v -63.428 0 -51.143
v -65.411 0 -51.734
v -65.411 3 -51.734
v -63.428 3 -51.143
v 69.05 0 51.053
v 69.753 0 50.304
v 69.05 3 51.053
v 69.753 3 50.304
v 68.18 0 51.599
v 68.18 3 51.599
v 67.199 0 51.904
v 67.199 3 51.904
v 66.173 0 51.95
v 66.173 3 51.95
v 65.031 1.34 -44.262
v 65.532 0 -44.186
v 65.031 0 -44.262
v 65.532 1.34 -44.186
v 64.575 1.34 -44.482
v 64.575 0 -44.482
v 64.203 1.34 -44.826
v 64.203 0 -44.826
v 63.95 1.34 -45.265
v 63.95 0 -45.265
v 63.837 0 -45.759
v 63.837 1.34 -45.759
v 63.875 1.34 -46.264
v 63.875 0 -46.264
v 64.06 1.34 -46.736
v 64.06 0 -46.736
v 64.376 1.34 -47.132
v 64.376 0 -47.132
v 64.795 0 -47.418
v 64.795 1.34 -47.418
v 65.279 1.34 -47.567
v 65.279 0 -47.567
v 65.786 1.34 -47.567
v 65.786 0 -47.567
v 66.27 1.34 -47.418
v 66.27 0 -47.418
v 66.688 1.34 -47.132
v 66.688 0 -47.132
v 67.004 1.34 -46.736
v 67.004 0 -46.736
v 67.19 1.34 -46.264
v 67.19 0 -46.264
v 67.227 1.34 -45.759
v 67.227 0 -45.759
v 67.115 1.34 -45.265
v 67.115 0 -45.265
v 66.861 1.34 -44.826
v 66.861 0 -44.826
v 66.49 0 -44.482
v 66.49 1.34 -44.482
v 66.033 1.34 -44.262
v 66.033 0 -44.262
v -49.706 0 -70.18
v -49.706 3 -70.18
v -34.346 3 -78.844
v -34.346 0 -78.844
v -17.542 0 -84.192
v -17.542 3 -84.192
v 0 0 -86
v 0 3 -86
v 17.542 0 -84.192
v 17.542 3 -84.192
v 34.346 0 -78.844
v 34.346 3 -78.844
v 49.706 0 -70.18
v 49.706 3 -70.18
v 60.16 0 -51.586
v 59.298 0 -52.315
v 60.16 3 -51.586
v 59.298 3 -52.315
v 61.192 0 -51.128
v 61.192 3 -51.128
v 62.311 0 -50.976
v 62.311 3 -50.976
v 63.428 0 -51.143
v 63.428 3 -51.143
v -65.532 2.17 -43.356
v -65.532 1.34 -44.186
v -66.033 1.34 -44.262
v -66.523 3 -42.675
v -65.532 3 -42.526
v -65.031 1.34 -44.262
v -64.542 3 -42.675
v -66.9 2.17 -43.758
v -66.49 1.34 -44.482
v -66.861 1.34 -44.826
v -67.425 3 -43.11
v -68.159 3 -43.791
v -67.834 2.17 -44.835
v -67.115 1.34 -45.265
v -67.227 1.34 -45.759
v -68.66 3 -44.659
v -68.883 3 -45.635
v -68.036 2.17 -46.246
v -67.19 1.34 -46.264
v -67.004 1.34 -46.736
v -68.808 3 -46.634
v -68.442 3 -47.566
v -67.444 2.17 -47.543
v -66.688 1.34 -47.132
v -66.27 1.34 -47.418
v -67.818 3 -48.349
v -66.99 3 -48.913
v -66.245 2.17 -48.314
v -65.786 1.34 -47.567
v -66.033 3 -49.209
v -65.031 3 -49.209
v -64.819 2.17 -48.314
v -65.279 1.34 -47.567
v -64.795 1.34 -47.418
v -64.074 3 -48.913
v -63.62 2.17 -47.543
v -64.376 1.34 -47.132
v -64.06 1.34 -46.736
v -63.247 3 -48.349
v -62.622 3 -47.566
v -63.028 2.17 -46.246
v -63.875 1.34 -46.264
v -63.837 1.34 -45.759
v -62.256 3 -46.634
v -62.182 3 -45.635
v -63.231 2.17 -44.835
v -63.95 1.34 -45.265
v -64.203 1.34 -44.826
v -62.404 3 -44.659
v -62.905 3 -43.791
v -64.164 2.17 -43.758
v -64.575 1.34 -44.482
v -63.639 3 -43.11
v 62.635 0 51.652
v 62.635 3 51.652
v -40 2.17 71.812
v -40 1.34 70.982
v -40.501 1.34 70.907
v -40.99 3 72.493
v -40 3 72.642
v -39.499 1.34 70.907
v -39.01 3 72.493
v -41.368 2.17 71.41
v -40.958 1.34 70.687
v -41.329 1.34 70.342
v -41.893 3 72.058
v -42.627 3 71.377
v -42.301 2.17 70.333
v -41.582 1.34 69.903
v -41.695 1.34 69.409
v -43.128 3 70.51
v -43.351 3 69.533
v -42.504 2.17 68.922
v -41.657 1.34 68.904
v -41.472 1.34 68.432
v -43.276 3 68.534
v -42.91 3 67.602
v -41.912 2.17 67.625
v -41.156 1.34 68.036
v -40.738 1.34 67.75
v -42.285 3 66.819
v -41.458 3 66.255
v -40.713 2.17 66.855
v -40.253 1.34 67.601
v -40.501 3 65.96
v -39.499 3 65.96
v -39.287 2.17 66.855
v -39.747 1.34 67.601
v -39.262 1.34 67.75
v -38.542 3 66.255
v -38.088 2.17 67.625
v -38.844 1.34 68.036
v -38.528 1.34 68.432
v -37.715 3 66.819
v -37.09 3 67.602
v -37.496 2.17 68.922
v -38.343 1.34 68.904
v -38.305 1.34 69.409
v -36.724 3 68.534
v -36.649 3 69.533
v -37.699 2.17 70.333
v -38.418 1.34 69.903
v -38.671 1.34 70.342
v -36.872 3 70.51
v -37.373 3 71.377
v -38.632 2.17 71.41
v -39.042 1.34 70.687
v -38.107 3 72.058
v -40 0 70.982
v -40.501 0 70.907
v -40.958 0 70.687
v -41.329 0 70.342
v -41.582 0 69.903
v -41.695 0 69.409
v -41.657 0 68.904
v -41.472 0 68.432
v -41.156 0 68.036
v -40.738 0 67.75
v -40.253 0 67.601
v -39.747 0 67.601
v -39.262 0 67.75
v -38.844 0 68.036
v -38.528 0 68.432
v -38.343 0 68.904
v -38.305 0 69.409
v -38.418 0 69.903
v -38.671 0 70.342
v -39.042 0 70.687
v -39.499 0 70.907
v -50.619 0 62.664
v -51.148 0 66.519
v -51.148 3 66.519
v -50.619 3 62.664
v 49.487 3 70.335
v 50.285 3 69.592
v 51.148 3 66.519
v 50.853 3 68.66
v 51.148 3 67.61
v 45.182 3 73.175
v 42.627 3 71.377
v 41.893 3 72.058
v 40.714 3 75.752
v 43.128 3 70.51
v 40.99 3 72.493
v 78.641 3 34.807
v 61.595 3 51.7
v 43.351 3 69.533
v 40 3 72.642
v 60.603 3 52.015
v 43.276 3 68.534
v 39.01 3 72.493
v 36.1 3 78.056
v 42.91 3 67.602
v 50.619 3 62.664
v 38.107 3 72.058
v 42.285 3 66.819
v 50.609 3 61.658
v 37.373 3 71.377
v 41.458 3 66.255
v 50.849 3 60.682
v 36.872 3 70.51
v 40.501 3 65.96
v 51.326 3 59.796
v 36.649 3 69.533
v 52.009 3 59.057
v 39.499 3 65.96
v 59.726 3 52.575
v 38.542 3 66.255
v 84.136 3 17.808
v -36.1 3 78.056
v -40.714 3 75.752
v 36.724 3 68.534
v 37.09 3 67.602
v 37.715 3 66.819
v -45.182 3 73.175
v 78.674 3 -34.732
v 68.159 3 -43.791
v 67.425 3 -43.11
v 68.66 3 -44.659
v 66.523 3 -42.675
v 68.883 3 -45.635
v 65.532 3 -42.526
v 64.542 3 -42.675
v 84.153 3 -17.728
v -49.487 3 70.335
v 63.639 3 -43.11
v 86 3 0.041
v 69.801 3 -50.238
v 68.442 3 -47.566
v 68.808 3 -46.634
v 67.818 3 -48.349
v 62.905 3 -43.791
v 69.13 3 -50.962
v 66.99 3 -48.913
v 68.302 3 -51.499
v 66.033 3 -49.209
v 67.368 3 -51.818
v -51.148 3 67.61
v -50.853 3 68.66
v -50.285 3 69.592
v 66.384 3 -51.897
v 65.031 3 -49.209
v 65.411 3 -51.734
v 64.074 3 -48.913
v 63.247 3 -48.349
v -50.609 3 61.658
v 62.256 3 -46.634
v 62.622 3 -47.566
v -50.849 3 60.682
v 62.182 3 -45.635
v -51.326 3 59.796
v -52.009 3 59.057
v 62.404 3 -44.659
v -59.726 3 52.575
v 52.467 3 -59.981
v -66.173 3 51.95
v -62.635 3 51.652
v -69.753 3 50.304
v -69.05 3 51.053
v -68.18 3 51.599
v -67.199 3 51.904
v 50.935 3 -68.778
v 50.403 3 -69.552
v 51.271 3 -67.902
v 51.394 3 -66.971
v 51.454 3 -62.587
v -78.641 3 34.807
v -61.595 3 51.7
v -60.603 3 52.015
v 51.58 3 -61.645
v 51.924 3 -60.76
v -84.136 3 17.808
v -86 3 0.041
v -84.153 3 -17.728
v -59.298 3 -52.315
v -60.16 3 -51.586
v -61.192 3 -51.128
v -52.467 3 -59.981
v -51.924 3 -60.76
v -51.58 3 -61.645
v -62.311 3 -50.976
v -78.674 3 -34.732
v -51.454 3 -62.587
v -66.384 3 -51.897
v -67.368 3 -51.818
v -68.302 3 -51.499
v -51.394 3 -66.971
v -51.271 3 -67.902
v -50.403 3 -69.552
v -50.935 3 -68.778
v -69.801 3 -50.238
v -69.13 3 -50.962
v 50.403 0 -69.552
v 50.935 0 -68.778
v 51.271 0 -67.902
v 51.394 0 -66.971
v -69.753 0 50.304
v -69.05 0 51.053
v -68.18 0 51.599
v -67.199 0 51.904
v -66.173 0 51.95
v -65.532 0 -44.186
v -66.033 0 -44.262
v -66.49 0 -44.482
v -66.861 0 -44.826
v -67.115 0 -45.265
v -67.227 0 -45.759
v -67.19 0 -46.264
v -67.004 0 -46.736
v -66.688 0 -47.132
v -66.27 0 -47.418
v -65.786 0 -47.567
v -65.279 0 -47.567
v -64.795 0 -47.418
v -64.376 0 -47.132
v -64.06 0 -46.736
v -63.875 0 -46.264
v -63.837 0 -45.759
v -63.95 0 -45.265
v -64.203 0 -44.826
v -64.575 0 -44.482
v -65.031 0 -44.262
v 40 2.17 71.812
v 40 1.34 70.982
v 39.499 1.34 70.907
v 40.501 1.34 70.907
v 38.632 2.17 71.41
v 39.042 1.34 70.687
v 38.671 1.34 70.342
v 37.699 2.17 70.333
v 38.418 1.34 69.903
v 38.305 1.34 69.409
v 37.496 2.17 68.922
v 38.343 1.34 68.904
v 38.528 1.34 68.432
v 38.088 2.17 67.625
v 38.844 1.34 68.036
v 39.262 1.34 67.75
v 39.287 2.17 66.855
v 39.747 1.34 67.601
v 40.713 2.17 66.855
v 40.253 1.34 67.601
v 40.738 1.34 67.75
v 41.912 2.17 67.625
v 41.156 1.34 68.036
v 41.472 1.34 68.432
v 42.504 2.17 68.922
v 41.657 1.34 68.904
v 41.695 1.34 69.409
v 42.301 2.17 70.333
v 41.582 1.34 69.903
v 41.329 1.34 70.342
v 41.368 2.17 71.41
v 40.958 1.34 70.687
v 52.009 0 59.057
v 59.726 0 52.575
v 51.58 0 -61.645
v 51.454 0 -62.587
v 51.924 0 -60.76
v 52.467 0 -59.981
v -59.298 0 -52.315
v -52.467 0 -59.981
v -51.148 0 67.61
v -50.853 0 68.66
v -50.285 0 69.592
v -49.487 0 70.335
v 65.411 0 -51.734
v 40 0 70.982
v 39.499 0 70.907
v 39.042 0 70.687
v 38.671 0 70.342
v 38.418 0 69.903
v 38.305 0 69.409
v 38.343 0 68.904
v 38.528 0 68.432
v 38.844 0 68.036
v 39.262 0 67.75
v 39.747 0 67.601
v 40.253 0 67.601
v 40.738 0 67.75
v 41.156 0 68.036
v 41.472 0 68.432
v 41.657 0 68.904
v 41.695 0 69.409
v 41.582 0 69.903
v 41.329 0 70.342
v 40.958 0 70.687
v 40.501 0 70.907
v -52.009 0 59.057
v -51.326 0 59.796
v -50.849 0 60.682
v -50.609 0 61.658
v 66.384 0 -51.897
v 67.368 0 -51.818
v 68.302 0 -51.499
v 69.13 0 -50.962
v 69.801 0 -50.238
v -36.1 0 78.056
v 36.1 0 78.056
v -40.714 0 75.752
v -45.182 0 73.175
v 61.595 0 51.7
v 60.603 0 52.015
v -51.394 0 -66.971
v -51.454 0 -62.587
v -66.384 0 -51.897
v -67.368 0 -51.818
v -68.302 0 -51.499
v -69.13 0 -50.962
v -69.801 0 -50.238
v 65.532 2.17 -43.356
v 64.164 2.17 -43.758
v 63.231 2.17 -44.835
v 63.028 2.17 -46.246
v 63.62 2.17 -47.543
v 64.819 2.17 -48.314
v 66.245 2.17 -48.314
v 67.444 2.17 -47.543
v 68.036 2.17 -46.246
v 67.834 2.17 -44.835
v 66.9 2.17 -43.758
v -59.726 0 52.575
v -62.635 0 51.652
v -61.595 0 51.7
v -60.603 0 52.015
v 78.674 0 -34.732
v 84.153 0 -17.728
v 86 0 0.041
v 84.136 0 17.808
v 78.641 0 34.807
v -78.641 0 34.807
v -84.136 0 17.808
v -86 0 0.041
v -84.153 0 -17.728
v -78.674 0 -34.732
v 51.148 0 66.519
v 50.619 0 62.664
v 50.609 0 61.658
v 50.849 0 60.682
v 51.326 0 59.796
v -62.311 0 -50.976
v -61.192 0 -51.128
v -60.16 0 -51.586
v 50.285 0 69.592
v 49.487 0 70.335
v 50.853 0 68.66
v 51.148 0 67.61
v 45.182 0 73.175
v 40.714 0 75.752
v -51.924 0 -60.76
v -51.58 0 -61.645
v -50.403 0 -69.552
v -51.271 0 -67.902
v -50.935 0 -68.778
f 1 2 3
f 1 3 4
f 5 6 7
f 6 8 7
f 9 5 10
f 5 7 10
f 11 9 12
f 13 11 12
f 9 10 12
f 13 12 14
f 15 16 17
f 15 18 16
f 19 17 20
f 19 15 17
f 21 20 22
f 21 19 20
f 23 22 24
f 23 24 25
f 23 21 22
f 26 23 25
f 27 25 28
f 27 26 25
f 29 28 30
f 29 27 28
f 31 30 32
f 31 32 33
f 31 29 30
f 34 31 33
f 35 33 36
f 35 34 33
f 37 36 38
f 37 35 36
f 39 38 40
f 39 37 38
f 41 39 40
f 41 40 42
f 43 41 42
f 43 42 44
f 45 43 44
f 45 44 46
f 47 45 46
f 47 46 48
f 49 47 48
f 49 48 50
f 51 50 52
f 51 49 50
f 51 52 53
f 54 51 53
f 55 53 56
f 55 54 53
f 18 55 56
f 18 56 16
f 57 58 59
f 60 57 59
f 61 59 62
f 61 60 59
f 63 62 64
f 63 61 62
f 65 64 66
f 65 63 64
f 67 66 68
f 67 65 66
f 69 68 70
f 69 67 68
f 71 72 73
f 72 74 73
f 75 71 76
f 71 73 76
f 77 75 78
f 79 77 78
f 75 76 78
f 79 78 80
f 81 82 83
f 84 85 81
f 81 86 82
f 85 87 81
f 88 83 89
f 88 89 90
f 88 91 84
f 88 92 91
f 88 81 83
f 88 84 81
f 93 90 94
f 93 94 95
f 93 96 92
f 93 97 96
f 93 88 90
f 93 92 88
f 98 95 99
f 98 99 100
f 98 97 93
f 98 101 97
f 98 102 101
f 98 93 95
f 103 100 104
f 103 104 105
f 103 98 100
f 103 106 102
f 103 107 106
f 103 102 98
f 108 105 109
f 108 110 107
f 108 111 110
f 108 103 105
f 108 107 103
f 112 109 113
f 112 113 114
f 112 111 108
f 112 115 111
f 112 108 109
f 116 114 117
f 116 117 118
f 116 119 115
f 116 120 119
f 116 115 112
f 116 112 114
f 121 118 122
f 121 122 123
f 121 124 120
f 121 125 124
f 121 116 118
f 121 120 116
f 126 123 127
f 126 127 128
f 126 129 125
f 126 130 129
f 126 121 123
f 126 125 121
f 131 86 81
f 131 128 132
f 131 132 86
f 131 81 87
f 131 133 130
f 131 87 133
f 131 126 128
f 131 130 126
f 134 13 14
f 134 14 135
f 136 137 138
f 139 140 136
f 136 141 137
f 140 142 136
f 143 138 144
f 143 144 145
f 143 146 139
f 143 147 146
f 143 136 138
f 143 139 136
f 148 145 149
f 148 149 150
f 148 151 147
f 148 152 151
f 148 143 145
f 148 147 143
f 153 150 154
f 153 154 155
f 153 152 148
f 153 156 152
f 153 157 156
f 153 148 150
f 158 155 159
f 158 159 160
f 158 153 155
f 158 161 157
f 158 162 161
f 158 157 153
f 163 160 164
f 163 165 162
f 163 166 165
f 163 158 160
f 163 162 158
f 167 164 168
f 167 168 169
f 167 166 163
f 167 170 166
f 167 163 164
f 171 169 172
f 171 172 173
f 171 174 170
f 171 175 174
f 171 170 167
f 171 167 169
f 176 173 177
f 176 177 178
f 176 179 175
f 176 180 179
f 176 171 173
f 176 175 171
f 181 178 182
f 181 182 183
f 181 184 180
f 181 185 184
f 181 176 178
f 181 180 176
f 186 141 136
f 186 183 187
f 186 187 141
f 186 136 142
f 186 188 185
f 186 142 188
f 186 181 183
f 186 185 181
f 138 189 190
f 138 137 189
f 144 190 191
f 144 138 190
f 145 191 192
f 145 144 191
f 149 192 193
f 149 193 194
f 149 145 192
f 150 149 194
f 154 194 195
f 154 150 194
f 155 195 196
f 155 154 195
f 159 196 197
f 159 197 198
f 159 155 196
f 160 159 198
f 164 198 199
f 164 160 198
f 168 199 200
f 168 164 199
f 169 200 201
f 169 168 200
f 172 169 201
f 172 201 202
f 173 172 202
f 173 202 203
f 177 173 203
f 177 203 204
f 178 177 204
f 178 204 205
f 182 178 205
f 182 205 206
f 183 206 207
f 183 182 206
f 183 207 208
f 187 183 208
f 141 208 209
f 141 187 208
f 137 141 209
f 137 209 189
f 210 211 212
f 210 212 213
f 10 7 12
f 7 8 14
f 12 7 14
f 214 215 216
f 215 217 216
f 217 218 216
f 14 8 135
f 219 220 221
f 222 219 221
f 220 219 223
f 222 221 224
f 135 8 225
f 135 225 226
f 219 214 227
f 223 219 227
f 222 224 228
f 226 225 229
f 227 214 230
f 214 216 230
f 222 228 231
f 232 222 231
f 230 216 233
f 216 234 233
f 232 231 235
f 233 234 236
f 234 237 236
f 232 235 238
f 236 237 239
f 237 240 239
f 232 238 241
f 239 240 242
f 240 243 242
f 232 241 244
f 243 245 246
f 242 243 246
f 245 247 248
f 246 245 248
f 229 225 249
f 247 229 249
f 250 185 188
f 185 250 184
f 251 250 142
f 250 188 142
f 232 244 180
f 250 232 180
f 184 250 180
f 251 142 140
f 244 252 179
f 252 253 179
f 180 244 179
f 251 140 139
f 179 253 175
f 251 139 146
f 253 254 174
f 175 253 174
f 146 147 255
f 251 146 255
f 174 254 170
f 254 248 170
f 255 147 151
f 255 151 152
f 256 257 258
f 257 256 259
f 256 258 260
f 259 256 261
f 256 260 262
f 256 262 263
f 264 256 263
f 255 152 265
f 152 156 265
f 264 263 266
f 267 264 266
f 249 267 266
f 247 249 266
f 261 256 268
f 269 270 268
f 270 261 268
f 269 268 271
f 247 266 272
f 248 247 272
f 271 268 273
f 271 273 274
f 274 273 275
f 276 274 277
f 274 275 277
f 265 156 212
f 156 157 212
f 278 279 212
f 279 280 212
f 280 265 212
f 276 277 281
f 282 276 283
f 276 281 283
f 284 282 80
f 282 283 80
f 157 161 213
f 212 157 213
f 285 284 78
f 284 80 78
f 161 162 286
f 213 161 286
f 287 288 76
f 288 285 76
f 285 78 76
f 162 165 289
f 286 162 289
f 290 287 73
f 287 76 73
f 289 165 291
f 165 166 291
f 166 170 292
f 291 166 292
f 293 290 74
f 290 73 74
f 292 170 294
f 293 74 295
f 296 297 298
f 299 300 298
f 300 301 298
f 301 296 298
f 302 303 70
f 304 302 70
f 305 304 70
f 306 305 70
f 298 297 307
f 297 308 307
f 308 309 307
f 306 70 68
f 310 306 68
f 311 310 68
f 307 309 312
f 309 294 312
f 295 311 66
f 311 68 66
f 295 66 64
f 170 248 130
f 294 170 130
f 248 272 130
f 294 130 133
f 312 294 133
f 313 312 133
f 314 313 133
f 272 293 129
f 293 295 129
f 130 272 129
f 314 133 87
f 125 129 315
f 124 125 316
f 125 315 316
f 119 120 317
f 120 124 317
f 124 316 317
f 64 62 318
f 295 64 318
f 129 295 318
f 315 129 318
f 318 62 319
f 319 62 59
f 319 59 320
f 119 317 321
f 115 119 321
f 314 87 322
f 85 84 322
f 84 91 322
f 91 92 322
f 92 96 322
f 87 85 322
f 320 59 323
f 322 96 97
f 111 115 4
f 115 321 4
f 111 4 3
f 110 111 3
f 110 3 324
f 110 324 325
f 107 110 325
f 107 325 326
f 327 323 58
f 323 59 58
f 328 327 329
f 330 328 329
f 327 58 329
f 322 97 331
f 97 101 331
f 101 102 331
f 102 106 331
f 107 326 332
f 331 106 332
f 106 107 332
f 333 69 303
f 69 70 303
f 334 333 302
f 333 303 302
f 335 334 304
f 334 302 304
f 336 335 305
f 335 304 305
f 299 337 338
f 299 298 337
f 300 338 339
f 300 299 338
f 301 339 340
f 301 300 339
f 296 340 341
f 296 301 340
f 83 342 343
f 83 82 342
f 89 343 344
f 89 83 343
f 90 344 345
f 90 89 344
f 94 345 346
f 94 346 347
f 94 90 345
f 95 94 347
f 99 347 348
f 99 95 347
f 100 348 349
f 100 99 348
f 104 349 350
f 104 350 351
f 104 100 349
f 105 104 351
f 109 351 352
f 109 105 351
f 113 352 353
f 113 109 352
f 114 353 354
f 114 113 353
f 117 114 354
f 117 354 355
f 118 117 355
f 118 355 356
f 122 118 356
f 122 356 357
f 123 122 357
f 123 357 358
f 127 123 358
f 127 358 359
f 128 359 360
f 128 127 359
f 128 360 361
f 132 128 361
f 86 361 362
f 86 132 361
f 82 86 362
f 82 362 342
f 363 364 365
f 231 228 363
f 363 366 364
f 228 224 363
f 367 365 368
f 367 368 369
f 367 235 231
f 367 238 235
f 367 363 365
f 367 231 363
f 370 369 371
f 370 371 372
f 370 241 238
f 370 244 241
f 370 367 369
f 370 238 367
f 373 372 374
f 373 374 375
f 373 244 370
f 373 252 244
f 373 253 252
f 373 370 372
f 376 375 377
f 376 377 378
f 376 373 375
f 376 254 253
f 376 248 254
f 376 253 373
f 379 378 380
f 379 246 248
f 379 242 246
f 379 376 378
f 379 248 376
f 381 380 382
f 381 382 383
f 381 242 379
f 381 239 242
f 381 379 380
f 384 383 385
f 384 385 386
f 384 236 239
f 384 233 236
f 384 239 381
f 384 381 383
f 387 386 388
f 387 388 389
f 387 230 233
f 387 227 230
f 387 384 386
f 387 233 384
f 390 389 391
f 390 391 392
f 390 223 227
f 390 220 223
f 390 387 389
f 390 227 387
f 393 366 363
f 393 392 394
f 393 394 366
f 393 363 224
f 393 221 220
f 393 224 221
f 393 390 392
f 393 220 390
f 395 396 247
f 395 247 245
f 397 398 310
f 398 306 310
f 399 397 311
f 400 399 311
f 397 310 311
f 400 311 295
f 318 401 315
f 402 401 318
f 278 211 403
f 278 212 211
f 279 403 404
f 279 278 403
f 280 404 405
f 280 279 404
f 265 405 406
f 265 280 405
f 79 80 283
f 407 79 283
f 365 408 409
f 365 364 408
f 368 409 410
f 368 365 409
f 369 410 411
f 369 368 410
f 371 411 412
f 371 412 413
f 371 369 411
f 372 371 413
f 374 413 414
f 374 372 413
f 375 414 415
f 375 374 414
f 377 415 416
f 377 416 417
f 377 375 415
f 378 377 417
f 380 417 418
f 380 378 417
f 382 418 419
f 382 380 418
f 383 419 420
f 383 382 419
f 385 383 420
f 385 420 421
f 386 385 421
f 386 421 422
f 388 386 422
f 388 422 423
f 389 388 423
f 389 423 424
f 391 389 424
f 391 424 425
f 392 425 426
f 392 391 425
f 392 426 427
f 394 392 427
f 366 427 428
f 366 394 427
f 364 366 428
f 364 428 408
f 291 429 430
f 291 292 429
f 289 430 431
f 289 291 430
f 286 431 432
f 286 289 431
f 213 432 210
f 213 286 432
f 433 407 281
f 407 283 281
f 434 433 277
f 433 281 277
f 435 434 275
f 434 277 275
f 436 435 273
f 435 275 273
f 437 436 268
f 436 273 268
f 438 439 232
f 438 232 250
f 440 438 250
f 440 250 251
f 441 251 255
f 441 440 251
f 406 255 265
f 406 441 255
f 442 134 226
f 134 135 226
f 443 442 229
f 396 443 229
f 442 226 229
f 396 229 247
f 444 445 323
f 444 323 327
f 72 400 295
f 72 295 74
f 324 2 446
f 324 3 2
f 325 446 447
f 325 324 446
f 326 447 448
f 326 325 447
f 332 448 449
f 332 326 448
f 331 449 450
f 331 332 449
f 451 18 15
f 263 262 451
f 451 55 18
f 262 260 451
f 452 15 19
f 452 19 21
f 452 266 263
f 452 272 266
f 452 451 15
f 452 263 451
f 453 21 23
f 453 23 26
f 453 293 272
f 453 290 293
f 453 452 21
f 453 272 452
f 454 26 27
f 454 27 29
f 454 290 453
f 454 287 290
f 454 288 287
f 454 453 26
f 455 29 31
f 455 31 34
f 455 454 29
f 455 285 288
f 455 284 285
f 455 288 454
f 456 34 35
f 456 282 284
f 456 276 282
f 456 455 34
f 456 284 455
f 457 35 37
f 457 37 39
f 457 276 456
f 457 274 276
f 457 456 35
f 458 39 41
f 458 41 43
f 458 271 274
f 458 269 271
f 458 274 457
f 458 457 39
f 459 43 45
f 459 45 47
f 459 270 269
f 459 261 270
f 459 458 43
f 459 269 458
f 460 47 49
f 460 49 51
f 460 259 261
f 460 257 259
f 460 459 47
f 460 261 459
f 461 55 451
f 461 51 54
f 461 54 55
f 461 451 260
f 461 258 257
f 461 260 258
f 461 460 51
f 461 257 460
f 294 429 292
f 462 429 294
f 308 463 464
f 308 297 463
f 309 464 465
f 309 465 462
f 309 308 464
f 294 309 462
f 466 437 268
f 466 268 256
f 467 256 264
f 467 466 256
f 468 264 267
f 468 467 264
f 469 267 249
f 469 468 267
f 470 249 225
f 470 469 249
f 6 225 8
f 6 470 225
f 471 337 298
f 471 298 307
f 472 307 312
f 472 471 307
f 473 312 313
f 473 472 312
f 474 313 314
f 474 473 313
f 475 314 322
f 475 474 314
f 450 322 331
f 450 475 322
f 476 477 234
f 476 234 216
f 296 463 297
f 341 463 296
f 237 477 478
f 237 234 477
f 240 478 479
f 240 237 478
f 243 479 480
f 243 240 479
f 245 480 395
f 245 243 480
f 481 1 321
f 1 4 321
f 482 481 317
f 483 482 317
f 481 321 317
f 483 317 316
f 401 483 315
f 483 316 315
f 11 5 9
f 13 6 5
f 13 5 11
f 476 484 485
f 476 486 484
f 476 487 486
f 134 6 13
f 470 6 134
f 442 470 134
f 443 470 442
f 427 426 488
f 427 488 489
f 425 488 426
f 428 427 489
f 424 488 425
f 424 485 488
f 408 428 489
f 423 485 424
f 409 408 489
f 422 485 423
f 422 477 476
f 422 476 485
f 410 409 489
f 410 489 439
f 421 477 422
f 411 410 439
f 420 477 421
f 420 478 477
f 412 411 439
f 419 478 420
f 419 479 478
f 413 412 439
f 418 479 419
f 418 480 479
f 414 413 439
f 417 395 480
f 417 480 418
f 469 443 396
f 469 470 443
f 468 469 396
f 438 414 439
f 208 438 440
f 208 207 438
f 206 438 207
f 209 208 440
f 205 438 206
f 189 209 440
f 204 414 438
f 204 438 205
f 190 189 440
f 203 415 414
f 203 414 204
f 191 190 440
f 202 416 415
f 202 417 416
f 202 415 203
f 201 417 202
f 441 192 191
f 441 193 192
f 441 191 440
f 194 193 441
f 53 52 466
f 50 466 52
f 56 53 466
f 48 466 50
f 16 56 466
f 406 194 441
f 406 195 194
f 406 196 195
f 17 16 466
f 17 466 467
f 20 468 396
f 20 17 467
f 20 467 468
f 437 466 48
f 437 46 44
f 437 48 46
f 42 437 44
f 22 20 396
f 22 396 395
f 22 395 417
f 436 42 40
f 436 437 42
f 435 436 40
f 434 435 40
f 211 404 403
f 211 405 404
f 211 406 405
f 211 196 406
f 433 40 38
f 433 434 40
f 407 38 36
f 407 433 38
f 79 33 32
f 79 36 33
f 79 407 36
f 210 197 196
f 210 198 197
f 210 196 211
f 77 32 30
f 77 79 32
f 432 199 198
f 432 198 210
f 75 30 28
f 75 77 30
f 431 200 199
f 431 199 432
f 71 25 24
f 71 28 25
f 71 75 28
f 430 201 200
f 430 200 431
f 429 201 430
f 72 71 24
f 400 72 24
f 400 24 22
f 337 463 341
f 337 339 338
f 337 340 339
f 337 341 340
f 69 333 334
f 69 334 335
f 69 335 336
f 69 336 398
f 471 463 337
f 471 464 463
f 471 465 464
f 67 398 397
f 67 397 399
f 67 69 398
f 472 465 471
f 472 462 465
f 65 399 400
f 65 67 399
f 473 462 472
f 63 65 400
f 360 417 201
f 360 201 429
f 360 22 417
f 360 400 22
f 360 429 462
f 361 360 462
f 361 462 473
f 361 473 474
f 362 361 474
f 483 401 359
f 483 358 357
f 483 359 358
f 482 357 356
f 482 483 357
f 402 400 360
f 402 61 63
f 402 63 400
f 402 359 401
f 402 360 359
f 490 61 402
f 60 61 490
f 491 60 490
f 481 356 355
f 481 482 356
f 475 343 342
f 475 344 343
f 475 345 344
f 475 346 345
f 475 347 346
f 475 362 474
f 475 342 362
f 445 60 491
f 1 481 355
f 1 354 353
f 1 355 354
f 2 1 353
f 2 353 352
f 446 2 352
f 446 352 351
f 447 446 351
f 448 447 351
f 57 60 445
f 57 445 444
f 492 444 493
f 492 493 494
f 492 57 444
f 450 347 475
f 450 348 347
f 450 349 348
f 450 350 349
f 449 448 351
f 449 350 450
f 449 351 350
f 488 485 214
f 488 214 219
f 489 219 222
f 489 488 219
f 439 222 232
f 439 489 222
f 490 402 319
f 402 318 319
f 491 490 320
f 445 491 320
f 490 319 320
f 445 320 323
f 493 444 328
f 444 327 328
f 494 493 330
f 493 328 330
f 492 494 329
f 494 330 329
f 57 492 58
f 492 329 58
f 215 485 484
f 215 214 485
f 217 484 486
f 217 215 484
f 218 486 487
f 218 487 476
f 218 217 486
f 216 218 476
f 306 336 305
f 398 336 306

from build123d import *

# Parameters (mm, degrees)
RESSALTO_EXTRUS_O1_DEPTH            = 3
ESCAREADO_PARA_SFHCS_M31_AT_2_COUNT = 2
ESCAREADO_PARA_SFHCS_M31_AT_2_PITCH = 117.96437389
ESCAREADO_PARA_SFHCS_M31_AT_3_COUNT = 2
ESCAREADO_PARA_SFHCS_M31_AT_3_PITCH = 80
ESCAREADO_PARA_SFHCS_M31_AT_4_COUNT = 2
ESCAREADO_PARA_SFHCS_M31_AT_4_PITCH = 156.207361139
FILETE1_R                           = 4


with BuildPart() as part:
    # Esboço1 → Ressalto-extrusão1 (new body)
    with BuildSketch(Plane(origin=(0, 0, 0), x_dir=(1, 0, 0), z_dir=(0, 1, 0))):
        with BuildLine():
            Line((-68.089865002, 52.533515816), (-60.990156529, 50.415201884))
            Line((-60.990156529, 50.415201884), (-51.474506905, 61.094962266))
            Line((-51.474506905, 61.094962266), (-51.366345618, 68.974622419))
            ThreePointArc((-51.366345618, 68.974622419), (0, 86), (51.366345618, 68.974622419))
            Line((51.366345618, 68.974622419), (51.474506905, 61.094962266))
            Line((51.474506905, 61.094962266), (60.990156529, 50.415201884))
            Line((60.990156529, 50.415201884), (68.089865002, 52.533515816))
            ThreePointArc((68.089865002, 52.533515816), (85.999638052, 0.24950947), (68.393545574, -52.137538529))
            Line((68.393545574, -52.137538529), (60.990156529, -51.512941417))
            Line((60.990156529, -51.512941417), (50.318654012, -60.477268457))
            Line((50.318654012, -60.477268457), (51.474506905, -68.893941235))
            ThreePointArc((51.474506905, -68.893941235), (44.026252256, -73.876174185), (36.1, -78.056325817))
            Line((36.1, -78.056325817), (-36.1, -78.056325817))
            ThreePointArc((-36.1, -78.056325817), (-44.026252256, -73.876174185), (-51.474506905, -68.893941235))
            Line((-51.474506905, -68.893941235), (-50.318654012, -60.477268457))
            Line((-50.318654012, -60.477268457), (-60.990156529, -51.512941417))
            Line((-60.990156529, -51.512941417), (-68.393545574, -52.137538529))
            ThreePointArc((-68.393545574, -52.137538529), (-85.999638052, 0.24950947), (-68.089865002, 52.533515816))
        make_face()
    extrude(amount=RESSALTO_EXTRUS_O1_DEPTH)

    # Esboço3 → Escareado para SFHCS M31 (revolve, cut)
    with BuildSketch(Plane(origin=(40, 3, 69.282032303), x_dir=(0, 0, 1), z_dir=(1, 0, 0))):
        Polygon((0, 0), (0, 3), (1.7, 3), (1.7, 1.66), (3.36, 0), align=None)
    escareado_para_sfhcs_m31 = revolve(axis=Axis((40, 9.35, 69.282032303), (0, -1, 0)), mode=Mode.SUBTRACT)

    # Escareado para SFHCS M31 at 2: Escareado para SFHCS M31 ×2
    with Locations(*[Vector(0.21643961393810332, 0, -0.9762960071199333) * (i * ESCAREADO_PARA_SFHCS_M31_AT_2_PITCH) for i in range(1, ESCAREADO_PARA_SFHCS_M31_AT_2_COUNT)]):
        add(escareado_para_sfhcs_m31, mode=Mode.SUBTRACT)

    # Escareado para SFHCS M31 at 3: Escareado para SFHCS M31 ×2
    with Locations(*[(-i * ESCAREADO_PARA_SFHCS_M31_AT_3_PITCH, 0, 0) for i in range(1, ESCAREADO_PARA_SFHCS_M31_AT_3_COUNT)]):
        add(escareado_para_sfhcs_m31, mode=Mode.SUBTRACT)

    # Escareado para SFHCS M31 at 4: Escareado para SFHCS M31 ×2
    with Locations(*[Vector(-0.6755902076156564, 0, -0.7372773368101276) * (i * ESCAREADO_PARA_SFHCS_M31_AT_4_PITCH) for i in range(1, ESCAREADO_PARA_SFHCS_M31_AT_4_COUNT)]):
        add(escareado_para_sfhcs_m31, mode=Mode.SUBTRACT)

    # Filete1
    filete1_edges = [part.edges().sort_by_distance(p)[0] for p in [
        (-68.089865002, 1.5, -52.533515816),
        (-60.990156529, 1.5, -50.415201884),
        (-51.474506905, 1.5, -61.094962266),
        (-51.366345618, 1.5, -68.974622419),
        (51.366345618, 1.5, -68.974622419),
        (51.474506905, 1.5, -61.094962266),
        (60.990156529, 1.5, -50.415201884),
        (68.089865002, 1.5, -52.533515816),
        (68.393545574, 1.5, 52.137538529),
        (60.990156529, 1.5, 51.512941417),
        (50.318654012, 1.5, 60.477268457),
        (51.474506905, 1.5, 68.893941235),
        (-51.474506905, 1.5, 68.893941235),
        (-50.318654012, 1.5, 60.477268457),
        (-60.990156529, 1.5, 51.512941417),
        (-68.393545574, 1.5, 52.137538529),
    ]]
    fillet(filete1_edges, radius=FILETE1_R)


solid = part.part
